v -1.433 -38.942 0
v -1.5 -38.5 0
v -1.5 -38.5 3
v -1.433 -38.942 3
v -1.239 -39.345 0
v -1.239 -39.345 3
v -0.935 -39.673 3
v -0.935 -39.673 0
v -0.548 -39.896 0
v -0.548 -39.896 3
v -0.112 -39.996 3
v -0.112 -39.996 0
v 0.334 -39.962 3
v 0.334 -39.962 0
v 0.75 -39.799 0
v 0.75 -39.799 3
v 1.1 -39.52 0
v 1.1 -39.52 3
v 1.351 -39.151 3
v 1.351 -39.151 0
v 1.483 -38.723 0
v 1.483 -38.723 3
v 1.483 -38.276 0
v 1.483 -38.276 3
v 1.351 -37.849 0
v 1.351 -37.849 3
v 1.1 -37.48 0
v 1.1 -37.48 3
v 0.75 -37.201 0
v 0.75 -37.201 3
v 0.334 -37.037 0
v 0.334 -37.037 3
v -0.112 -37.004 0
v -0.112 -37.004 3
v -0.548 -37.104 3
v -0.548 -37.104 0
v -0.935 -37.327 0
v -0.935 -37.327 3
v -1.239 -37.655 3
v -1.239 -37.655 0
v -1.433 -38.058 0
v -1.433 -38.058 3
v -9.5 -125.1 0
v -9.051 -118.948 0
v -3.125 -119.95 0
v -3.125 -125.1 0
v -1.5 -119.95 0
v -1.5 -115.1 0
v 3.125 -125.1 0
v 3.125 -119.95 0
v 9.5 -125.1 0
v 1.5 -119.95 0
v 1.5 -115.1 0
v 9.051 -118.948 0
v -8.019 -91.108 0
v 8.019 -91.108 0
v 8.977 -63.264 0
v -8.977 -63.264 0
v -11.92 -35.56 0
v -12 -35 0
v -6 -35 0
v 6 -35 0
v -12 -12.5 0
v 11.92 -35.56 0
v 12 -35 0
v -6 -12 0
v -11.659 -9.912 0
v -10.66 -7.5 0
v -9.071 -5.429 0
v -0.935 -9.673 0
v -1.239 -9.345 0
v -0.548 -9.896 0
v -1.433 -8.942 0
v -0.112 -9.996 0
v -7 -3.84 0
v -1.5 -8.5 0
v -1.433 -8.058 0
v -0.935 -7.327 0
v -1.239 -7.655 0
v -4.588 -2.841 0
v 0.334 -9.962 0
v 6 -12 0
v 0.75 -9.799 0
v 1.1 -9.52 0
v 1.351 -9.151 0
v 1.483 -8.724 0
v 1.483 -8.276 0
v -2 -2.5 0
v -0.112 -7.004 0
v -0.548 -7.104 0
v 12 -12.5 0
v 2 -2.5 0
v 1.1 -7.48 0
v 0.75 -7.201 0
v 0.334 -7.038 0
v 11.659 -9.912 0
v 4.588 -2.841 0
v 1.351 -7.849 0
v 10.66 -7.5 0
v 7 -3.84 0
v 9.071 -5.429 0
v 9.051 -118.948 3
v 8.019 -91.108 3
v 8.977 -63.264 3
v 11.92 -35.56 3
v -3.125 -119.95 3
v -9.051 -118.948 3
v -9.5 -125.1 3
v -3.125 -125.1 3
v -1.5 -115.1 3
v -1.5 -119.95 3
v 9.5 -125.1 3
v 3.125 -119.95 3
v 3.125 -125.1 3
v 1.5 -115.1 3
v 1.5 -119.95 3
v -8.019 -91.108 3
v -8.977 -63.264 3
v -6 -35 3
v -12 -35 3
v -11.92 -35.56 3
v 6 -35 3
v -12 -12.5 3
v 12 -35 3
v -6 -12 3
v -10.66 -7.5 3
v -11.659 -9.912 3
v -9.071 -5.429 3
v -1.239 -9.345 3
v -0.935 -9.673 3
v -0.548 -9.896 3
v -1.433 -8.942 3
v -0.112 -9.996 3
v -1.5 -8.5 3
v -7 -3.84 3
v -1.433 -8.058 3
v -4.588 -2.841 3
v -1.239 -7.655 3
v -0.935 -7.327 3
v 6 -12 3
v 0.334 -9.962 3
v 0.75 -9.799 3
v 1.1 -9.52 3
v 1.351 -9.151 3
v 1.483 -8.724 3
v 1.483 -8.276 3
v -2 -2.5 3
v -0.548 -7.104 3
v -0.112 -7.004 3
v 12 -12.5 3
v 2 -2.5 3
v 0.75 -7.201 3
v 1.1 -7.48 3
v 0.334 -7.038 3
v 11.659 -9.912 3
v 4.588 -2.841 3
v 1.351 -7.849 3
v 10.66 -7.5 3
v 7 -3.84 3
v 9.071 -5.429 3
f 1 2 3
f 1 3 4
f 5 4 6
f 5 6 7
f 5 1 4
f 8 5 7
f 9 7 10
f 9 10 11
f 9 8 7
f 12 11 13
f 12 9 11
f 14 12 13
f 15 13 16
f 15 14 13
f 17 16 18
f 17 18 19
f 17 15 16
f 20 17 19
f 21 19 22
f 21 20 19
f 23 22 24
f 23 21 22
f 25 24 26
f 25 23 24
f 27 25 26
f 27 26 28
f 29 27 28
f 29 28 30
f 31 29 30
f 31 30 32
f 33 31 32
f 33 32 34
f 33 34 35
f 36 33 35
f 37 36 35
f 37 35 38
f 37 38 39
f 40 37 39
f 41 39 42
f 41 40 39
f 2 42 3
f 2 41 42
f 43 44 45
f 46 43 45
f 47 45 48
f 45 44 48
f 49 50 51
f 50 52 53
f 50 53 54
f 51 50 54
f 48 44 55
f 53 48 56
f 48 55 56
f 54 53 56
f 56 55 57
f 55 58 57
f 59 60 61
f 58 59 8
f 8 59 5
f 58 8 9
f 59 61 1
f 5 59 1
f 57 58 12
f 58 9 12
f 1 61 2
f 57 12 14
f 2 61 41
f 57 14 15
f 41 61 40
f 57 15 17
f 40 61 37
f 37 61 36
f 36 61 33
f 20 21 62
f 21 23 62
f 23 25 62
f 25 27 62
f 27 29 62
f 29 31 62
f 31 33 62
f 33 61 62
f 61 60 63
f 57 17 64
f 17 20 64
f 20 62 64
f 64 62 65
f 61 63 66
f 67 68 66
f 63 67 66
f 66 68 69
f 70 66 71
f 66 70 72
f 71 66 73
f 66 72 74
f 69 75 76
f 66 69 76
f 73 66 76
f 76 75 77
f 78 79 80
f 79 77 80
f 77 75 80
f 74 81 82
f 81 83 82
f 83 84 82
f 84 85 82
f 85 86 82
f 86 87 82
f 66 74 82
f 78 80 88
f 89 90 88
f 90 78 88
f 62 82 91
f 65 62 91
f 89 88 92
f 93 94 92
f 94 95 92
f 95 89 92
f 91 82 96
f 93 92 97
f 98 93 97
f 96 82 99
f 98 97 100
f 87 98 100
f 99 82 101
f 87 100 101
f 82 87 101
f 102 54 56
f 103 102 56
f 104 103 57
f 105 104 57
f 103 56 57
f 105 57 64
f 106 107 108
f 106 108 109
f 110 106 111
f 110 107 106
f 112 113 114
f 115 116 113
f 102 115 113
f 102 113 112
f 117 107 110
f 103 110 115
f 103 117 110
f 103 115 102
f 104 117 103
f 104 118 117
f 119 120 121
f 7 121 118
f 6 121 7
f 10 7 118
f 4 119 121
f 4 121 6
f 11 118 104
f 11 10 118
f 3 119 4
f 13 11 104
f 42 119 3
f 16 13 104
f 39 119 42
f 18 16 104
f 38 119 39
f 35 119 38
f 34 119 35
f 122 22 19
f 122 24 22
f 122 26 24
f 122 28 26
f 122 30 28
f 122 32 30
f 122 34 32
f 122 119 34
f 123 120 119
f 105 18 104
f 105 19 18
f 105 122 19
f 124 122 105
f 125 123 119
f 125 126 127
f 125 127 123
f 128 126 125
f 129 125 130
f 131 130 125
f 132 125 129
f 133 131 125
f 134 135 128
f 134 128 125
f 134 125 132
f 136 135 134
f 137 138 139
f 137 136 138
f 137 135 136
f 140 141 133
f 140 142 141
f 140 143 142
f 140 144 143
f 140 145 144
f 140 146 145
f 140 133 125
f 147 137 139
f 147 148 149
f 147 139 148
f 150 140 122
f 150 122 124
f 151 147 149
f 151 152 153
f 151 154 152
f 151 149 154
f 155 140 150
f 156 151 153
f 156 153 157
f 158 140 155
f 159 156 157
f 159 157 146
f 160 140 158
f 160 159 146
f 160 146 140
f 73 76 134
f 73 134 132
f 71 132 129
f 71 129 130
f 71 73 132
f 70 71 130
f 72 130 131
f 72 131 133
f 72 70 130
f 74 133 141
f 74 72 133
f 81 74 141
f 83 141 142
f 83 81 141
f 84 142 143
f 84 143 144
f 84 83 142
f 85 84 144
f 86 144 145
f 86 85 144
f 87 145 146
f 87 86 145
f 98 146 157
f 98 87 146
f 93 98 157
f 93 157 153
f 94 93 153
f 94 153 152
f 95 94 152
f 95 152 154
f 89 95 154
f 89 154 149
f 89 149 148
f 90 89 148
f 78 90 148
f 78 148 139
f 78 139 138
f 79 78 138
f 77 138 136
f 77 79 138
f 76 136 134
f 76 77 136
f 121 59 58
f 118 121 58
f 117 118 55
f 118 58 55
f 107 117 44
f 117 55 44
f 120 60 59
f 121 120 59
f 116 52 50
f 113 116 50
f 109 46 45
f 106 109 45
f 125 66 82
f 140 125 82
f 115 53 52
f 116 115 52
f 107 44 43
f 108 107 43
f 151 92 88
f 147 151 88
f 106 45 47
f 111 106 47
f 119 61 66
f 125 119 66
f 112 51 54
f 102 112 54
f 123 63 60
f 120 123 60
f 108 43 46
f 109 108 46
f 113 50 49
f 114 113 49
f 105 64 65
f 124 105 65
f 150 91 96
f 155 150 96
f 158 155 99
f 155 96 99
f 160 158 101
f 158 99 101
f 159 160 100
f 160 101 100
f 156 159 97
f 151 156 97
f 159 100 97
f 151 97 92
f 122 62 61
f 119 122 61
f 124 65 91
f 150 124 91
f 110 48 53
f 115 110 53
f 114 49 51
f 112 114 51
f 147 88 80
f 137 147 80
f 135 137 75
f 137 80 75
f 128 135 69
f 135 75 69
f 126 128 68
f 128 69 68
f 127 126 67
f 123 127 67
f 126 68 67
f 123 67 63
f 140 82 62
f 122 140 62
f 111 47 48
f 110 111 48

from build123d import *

# Parameters (mm, degrees)
ESBO_O1_R                = 1.5
RESSALTO_EXTRUS_O1_DEPTH = 3


with BuildPart() as part:
    # Esboço1 → Ressalto-extrusão1 (new body)
    with BuildSketch(Plane.XY):
        with BuildLine():
            Line((3.125, -119.95), (3.125, -125.1))
            Line((3.125, -125.1), (9.5, -125.1))
            Line((9.5, -125.1), (9.051444859, -118.948386637))
            ThreePointArc((9.051444859, -118.948386637), (8.249352939, -77.177382145), (11.920153881, -35.560253603))
            Line((11.920153881, -35.560253603), (12, -35))
            Line((12, -35), (12, -12.5))
            ThreePointArc((12, -12.5), (9.071067812, -5.428932188), (2, -2.5))
            Line((2, -2.5), (0, -2.5))
            Line((0, -2.5), (-2, -2.5))
            ThreePointArc((-2, -2.5), (-9.071067812, -5.428932188), (-12, -12.5))
            Line((-12, -12.5), (-12, -35))
            Line((-12, -35), (-11.920153926, -35.560253285))
            ThreePointArc((-11.920153926, -35.560253285), (-8.249352944, -77.177381984), (-9.051444859, -118.948386634))
            Line((-9.051444859, -118.948386634), (-9.5, -125.1))
            Line((-9.5, -125.1), (-3.125, -125.1))
            Line((-3.125, -125.1), (-3.125, -119.95))
            Line((-3.125, -119.95), (-1.5, -119.95))
            Line((-1.5, -119.95), (-1.5, -115.1))
            Line((-1.5, -115.1), (1.5, -115.1))
            Line((1.5, -115.1), (1.5, -119.95))
            Line((1.5, -119.95), (3.125, -119.95))
        make_face()
        with Locations(Location((0, -8.5, 0), (0, 0, 180))):
            Circle(ESBO_O1_R, mode=Mode.SUBTRACT)
        with Locations(Location((0, -38.499871023, 0), (0, 0, 180))):
            Circle(ESBO_O1_R, mode=Mode.SUBTRACT)
        Polygon((-6, -23.5), (-6, -12), (6, -12), (6, -35), (2.474745195, -35), (-2.5, -35), (-6, -35), align=None, mode=Mode.SUBTRACT)
    extrude(amount=RESSALTO_EXTRUS_O1_DEPTH)


solid = part.part
